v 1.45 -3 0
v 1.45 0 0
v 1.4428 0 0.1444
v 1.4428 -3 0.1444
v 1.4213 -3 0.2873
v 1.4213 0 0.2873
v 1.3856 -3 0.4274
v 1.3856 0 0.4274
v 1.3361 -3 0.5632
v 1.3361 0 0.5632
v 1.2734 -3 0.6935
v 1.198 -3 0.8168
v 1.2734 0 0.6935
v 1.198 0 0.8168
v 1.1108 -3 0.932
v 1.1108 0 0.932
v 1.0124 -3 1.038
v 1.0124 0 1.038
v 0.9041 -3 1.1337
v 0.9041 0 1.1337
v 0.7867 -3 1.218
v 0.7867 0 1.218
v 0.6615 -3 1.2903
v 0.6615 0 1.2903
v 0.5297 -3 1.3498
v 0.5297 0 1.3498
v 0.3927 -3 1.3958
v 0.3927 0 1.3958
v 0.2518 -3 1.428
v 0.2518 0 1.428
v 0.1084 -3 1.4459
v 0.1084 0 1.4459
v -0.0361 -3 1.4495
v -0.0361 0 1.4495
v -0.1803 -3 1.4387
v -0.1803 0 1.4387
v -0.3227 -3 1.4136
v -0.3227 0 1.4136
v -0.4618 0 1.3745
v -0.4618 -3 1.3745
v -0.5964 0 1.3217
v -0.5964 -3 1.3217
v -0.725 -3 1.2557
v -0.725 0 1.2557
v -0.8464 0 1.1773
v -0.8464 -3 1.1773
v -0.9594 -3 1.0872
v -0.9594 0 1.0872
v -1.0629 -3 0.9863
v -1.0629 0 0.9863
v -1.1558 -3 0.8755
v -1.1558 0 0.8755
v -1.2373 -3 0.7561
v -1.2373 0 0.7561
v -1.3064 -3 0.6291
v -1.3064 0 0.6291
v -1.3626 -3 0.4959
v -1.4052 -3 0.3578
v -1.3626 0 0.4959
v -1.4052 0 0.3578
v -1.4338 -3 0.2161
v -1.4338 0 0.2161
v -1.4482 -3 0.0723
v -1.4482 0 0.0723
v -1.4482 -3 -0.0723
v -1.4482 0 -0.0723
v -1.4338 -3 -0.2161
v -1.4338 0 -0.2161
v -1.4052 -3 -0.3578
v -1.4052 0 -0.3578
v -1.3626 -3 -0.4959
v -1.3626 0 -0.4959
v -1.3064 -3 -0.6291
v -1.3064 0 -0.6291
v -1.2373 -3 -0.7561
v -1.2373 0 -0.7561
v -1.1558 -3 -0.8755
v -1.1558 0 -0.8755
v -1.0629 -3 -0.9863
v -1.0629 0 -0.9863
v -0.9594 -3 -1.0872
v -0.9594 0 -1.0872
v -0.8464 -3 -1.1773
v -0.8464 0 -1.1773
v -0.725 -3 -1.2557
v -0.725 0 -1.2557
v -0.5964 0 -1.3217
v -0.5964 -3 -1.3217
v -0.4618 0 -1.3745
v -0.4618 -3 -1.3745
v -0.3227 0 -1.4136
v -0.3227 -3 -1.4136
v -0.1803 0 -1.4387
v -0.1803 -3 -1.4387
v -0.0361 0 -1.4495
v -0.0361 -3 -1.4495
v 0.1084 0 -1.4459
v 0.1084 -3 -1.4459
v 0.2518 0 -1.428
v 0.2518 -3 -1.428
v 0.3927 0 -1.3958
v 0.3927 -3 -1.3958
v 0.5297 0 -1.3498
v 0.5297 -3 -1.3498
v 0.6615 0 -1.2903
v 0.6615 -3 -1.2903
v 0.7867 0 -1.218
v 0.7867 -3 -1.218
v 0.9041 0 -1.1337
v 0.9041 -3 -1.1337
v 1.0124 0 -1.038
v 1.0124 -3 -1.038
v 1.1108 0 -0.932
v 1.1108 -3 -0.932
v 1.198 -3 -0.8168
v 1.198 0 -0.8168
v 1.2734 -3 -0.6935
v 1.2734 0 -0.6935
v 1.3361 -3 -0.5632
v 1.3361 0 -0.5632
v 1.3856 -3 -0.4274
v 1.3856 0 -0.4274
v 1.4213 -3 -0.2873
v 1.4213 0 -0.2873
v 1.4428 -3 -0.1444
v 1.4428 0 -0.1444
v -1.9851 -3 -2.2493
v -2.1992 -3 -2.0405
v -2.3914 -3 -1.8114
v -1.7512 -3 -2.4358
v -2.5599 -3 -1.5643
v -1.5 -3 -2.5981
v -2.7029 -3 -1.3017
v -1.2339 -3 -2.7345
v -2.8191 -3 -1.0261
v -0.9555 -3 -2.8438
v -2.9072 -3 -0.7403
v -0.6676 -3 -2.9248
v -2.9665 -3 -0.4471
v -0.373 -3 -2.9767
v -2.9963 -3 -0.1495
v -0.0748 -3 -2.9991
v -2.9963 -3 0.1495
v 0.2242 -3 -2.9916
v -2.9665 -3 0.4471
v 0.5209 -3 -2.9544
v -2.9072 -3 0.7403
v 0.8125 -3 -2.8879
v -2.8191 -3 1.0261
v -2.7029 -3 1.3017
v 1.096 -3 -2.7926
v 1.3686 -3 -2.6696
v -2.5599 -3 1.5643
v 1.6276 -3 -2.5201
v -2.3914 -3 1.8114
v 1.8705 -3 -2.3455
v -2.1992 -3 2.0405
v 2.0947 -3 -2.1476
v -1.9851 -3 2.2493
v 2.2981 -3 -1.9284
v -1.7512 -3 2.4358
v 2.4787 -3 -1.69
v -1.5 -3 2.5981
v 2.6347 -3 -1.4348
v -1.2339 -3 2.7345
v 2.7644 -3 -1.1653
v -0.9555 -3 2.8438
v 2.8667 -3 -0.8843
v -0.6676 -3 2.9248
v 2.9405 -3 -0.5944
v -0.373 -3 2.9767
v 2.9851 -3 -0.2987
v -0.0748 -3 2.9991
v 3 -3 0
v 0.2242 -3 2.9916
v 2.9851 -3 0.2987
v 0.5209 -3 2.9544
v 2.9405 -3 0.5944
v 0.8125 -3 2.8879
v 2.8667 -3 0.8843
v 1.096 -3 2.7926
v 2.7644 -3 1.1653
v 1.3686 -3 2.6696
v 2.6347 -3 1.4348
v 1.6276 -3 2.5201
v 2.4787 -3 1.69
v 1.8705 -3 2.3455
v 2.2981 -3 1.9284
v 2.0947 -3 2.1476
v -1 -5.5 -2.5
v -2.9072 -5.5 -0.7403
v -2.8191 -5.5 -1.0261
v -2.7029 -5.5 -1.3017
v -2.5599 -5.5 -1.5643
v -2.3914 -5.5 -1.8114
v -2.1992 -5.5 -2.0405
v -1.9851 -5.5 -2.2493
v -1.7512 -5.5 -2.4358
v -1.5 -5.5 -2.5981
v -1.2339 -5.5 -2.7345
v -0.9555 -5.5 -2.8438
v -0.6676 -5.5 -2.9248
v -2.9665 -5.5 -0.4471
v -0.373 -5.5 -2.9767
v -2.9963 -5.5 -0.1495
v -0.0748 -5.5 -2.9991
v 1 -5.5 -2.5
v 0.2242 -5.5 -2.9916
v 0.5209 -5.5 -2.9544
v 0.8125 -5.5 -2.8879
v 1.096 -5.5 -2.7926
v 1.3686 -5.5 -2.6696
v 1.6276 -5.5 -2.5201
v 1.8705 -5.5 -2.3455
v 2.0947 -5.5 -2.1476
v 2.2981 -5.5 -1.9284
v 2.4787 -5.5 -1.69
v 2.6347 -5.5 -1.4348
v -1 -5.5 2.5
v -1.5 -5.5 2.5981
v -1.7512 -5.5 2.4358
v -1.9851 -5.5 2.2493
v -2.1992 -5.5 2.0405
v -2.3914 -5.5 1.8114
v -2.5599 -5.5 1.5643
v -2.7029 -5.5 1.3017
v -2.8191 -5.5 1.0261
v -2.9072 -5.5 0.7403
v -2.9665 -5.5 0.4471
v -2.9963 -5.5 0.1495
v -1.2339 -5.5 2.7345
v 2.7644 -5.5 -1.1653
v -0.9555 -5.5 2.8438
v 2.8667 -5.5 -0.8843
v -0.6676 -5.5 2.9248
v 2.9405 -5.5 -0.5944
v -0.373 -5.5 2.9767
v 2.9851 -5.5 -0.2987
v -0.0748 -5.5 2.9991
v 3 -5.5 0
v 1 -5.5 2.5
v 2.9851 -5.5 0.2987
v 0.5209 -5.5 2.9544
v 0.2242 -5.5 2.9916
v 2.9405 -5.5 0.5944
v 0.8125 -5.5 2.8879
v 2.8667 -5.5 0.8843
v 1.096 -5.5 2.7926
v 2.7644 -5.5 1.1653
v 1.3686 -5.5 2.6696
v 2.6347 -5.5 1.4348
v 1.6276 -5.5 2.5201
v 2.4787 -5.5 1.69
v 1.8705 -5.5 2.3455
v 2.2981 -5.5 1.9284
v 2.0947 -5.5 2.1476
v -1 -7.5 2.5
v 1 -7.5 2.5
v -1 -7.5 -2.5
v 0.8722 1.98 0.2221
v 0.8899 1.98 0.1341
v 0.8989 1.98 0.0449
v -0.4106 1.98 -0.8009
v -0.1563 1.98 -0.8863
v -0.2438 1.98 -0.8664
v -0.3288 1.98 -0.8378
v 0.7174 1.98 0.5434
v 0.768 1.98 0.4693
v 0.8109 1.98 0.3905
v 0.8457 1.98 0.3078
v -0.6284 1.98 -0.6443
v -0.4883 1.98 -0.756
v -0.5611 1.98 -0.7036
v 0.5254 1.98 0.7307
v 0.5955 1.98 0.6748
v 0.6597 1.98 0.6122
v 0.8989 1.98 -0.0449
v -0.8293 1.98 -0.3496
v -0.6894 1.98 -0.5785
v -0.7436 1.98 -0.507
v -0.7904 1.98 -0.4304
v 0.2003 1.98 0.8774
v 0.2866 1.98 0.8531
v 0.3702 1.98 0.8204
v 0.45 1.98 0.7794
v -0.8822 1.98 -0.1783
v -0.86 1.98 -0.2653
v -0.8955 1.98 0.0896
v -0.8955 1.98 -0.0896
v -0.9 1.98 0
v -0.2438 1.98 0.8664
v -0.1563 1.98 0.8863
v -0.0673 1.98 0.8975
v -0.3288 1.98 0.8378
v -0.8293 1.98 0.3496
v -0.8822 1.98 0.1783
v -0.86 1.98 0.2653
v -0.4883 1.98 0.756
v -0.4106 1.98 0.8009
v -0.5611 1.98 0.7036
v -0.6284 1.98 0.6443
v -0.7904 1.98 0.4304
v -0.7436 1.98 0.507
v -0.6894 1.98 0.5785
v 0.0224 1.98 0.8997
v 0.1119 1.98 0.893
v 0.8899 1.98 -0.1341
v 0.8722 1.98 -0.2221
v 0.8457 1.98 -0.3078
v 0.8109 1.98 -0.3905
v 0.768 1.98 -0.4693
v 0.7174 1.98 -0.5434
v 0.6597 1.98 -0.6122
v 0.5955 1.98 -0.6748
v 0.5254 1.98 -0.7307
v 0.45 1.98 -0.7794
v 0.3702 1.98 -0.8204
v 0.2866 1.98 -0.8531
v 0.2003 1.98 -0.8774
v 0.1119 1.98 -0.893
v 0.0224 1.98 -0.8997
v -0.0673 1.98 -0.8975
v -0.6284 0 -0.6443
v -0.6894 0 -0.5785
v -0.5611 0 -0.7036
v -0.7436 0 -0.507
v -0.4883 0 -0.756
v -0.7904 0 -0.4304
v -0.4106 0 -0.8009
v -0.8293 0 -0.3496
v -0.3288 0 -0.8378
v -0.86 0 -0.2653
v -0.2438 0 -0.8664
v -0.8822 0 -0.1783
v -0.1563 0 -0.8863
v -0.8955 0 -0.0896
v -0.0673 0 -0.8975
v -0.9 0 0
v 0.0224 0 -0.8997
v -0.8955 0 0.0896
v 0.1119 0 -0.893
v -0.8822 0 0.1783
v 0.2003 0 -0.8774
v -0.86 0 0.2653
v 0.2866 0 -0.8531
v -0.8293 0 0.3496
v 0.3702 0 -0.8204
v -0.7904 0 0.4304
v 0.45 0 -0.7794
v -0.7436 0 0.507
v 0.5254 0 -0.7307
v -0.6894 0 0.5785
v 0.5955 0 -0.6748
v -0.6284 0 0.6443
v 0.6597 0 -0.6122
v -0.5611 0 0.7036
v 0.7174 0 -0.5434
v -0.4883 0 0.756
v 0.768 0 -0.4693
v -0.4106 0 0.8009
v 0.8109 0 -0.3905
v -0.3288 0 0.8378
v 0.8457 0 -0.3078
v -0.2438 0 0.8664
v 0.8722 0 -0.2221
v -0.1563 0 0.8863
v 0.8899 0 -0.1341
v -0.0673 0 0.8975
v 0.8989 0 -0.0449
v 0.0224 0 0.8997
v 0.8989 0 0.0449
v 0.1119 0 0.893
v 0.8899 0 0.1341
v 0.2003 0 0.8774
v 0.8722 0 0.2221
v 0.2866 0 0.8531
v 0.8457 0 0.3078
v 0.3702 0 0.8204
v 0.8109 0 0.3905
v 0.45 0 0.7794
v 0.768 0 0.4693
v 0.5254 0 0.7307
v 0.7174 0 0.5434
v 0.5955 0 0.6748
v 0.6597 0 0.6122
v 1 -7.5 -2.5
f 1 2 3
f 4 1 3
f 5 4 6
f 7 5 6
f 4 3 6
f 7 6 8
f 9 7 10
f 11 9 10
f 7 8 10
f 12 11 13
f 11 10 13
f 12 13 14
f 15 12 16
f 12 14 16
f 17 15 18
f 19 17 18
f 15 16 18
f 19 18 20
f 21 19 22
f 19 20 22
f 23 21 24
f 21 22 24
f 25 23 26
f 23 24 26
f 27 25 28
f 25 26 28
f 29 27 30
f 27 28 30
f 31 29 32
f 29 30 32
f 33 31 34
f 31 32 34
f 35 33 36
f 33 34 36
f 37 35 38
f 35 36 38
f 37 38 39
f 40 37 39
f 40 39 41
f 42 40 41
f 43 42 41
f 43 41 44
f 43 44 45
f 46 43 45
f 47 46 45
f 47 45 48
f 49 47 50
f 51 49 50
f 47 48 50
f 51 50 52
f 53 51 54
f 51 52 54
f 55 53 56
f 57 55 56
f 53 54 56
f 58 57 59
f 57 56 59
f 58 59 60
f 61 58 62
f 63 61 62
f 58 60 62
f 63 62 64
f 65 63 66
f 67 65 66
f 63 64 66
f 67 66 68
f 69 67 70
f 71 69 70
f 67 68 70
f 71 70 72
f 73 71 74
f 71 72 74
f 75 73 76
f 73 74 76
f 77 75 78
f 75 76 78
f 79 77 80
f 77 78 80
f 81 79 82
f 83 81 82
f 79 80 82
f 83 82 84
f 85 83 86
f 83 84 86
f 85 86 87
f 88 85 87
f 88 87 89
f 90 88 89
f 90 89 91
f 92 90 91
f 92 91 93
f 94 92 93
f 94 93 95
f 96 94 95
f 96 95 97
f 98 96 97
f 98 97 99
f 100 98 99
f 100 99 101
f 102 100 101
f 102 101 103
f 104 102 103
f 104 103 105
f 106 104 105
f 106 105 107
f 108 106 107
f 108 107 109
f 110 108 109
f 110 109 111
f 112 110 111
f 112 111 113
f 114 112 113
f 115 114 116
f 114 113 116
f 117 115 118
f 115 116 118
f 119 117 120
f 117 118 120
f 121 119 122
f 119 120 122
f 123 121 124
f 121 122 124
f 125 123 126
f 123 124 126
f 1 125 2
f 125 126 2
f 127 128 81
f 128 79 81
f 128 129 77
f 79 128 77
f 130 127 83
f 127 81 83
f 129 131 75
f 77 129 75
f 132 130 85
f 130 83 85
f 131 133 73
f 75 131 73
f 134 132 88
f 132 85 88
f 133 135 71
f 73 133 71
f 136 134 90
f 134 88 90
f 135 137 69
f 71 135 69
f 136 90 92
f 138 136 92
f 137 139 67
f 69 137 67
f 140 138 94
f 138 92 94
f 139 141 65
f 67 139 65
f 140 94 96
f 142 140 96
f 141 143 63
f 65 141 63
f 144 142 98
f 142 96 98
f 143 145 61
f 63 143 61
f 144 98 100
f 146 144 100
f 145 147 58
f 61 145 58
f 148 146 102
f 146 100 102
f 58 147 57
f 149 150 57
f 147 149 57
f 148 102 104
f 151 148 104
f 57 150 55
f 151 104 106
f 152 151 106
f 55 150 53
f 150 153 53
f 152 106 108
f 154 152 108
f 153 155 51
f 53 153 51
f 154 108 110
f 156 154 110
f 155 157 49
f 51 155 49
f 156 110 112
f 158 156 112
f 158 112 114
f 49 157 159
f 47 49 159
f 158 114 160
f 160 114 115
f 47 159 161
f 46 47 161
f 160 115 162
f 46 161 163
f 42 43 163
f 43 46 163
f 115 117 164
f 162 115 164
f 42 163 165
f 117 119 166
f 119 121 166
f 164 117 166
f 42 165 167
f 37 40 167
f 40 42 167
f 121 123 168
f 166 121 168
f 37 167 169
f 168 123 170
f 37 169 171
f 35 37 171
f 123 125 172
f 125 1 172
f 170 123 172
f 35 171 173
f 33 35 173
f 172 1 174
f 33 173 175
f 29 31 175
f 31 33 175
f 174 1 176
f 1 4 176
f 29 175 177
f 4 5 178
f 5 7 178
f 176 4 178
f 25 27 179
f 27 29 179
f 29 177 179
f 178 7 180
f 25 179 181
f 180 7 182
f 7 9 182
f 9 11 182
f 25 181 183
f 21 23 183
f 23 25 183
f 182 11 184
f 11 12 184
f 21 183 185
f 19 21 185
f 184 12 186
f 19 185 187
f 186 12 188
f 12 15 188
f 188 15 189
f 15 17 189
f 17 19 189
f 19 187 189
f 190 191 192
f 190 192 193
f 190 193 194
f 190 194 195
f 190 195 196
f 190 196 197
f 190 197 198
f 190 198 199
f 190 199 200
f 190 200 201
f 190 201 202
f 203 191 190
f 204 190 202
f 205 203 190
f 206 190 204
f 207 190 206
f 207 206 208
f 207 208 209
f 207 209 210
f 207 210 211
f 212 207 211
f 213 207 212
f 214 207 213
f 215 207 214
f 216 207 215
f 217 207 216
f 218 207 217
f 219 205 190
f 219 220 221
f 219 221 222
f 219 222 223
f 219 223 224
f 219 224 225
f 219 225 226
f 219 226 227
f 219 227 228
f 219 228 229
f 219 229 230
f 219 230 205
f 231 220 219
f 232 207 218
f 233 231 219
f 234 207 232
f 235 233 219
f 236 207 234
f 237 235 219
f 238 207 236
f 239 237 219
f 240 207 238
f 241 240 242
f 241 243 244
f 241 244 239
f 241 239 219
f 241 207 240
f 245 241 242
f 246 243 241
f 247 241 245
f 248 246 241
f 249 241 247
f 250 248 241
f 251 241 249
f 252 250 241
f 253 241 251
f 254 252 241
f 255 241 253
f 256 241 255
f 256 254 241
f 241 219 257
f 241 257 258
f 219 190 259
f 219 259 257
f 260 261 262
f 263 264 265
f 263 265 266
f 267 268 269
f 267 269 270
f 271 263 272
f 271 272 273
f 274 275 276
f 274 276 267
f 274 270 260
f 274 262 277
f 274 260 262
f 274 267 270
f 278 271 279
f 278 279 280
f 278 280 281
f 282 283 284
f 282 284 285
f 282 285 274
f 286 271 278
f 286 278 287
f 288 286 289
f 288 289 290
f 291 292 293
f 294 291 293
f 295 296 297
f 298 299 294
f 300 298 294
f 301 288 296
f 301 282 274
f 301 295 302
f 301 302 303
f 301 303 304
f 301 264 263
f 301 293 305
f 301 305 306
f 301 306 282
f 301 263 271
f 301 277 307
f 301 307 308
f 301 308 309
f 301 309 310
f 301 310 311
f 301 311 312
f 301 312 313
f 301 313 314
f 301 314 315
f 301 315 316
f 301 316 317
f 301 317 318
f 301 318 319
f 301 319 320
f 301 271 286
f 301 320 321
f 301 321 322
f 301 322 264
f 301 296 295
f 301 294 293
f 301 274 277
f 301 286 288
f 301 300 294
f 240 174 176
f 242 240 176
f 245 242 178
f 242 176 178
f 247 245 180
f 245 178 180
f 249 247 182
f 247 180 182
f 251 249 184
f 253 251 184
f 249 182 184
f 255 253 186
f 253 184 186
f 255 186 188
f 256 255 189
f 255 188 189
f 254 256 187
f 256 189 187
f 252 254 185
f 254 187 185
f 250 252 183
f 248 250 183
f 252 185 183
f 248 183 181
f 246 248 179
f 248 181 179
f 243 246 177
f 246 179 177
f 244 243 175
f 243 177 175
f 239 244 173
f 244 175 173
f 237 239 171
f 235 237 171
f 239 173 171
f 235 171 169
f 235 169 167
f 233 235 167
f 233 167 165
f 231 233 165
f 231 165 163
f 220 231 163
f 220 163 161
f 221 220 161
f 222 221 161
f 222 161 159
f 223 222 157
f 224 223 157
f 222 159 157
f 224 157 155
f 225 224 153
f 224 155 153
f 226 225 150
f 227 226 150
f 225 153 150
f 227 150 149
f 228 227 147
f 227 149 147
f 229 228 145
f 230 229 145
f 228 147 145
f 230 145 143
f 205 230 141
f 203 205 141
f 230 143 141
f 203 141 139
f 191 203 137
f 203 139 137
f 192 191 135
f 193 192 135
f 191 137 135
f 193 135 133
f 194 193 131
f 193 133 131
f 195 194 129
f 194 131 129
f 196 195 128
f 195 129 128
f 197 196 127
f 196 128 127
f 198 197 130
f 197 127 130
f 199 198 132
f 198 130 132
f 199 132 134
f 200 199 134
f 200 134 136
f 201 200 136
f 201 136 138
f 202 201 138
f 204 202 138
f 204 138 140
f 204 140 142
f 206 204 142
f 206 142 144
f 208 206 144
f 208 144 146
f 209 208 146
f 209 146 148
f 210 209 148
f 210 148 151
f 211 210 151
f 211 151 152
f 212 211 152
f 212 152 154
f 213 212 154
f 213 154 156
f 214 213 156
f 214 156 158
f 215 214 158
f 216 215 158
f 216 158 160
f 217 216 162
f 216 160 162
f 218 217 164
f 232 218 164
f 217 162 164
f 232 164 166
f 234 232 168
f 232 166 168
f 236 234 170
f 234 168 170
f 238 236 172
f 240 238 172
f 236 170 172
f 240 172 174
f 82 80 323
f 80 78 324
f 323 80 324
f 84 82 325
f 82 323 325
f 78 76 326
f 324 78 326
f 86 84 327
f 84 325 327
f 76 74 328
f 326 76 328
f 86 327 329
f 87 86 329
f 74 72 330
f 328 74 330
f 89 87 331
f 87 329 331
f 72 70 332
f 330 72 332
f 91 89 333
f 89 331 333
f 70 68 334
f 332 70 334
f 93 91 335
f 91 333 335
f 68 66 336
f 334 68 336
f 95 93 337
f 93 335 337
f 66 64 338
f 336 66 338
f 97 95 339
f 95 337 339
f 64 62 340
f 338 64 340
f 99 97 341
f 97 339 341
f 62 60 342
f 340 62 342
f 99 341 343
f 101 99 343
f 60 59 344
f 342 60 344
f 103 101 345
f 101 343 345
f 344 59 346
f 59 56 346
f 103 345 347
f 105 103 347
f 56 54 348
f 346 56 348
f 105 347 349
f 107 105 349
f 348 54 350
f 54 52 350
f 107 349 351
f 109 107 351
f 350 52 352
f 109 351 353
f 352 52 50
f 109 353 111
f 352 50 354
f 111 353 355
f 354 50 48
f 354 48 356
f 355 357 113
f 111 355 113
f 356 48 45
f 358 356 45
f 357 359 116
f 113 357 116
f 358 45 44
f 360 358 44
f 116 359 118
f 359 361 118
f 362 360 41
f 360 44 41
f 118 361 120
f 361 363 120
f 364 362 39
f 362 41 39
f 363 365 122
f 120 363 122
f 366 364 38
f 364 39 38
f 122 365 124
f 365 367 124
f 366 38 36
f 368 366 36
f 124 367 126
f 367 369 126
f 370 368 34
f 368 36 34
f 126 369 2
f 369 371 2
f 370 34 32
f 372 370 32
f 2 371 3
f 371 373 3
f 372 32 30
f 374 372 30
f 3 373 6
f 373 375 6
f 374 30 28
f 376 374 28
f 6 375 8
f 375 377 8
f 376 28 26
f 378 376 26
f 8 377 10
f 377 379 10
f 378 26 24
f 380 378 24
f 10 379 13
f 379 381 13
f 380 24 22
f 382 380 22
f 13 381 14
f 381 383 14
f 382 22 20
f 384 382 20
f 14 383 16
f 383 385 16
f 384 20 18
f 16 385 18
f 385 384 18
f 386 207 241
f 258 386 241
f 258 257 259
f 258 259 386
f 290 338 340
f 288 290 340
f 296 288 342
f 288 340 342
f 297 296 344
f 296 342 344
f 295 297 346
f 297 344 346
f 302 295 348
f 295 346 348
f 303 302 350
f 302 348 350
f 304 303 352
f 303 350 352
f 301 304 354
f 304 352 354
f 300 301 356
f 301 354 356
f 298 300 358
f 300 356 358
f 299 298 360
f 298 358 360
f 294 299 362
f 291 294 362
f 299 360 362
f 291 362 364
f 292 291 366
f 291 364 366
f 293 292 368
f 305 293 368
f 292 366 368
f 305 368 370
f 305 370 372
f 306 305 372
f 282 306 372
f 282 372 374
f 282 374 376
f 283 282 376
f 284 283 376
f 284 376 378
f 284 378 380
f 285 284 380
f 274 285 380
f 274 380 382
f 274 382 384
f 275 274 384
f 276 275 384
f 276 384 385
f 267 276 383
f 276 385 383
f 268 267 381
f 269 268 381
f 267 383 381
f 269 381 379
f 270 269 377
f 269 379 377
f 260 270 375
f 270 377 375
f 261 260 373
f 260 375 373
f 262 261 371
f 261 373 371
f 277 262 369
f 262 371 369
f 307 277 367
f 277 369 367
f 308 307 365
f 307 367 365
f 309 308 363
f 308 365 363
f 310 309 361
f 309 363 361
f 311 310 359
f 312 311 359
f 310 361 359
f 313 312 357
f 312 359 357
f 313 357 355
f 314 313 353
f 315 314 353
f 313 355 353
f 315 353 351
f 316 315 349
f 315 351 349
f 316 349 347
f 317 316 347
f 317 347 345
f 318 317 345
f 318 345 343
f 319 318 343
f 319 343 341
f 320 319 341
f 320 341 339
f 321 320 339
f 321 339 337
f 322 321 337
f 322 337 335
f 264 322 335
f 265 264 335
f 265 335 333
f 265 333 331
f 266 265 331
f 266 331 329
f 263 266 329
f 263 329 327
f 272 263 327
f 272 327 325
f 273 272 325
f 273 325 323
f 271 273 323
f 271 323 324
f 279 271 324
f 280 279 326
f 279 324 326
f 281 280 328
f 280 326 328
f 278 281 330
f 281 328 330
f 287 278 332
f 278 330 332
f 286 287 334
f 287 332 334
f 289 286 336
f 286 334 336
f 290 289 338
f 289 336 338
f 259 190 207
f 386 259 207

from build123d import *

# Parameters (mm, degrees)
F0_R     = 1.45
F1_DEPTH = 3
F2_R     = 3
F3_DEPTH = 2.5
F4_R     = 0.9
F5_DEPTH = 1.98
F6_W     = 2
F6_H     = 5
F7_DEPTH = 2


with BuildPart() as f1:
    # F0 (on Front) → F1 (new body)
    with BuildSketch(Plane.XZ):
        Circle(F0_R)
    extrude(amount=F1_DEPTH)

    # F2 (on face) → F3 (join)
    with BuildSketch(Plane.XZ.offset(3)):
        Circle(F2_R)
    extrude(amount=F3_DEPTH)

    # F4 (on face) → F5 (join)
    with BuildSketch(Plane(origin=(0, 0, 0), x_dir=(-1, 0, 0), z_dir=(0, 1, 0))):
        Circle(F4_R)
    extrude(amount=F5_DEPTH)

    # F6 (on face) → F7 (join)
    with BuildSketch(Plane.XZ.offset(5.5)):
        Rectangle(F6_W, F6_H)
    extrude(amount=F7_DEPTH)


solid = f1.part
